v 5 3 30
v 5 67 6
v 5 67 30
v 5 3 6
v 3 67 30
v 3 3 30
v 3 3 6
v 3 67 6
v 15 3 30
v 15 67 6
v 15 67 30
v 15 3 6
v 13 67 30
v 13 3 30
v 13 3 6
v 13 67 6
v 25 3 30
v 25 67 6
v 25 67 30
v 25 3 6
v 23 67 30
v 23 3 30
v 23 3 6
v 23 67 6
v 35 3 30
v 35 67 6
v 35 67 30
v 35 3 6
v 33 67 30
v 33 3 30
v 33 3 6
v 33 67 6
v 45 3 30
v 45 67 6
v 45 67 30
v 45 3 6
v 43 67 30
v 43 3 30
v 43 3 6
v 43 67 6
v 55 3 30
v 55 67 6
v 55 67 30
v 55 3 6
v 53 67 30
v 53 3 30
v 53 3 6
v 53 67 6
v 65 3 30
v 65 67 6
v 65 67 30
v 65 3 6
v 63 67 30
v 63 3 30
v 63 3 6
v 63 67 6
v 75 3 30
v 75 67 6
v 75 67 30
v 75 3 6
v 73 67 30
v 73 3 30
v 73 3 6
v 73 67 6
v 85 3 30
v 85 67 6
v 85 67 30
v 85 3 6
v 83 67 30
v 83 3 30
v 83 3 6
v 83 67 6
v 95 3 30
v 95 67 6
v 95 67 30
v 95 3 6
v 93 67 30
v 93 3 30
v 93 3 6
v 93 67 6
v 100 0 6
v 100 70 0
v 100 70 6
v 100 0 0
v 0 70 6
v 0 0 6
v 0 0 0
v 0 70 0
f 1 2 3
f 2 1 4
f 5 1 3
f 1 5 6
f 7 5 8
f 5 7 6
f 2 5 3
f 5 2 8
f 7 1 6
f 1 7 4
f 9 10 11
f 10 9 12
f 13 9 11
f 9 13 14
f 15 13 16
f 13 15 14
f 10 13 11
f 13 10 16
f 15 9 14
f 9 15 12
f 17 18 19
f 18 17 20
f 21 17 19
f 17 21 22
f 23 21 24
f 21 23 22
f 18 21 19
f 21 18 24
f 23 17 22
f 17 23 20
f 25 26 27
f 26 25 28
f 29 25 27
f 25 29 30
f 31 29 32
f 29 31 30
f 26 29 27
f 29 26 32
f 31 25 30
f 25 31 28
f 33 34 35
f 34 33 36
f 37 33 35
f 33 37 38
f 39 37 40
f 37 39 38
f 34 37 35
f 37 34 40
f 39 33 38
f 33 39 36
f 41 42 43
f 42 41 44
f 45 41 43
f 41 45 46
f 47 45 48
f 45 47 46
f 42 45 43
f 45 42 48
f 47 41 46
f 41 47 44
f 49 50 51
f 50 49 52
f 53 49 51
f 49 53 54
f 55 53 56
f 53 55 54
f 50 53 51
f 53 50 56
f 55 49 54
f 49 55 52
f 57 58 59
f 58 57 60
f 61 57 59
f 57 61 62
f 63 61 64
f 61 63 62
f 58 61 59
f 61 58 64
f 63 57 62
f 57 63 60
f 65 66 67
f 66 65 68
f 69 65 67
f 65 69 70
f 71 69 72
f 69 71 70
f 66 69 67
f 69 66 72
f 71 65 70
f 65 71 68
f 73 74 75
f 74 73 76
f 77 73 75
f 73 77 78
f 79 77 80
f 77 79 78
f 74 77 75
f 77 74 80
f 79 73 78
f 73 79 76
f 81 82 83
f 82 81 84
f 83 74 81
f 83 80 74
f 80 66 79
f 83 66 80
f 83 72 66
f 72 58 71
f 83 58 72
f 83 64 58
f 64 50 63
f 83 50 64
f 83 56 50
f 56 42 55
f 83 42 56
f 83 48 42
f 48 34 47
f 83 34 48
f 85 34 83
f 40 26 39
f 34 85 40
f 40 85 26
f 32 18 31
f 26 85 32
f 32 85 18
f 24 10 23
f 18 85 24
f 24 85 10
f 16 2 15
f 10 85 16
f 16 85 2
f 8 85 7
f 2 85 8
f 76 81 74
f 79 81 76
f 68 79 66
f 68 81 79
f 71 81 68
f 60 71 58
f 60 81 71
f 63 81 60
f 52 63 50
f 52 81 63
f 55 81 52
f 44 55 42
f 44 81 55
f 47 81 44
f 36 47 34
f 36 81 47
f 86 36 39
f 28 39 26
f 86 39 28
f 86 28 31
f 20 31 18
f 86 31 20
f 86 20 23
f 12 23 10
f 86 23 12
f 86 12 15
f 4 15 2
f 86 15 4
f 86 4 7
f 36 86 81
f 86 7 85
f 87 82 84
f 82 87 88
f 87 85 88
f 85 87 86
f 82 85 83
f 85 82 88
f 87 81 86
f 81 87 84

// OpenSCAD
$fn = 32;

// ----------------------------------------------------------------------
// Heatsink: uniform fin block
// ----------------------------------------------------------------------

// --- parameters (mm) ---
base_l = 100;             // base length, X
base_w = 70;              // base width, Y
base_t = 6;               // base plate thickness
fin_h = 25;               // fin height above the base
fin_t = 2;                // fin thickness
edge = 3;                 // margin from the base ends
pitch = 10;               // fin pitch

n_fins = floor((base_l - 2 * edge - fin_t) / pitch) + 1;  // fin count
total_h = base_t + fin_h - 1;  // overall height

union() {
  cube([base_l, base_w, base_t]);
  for (i = [0 : n_fins - 1])
    translate([edge + i * pitch, edge, base_t - 1])
      cube([fin_t, base_w - 2 * edge, fin_h]);
}
